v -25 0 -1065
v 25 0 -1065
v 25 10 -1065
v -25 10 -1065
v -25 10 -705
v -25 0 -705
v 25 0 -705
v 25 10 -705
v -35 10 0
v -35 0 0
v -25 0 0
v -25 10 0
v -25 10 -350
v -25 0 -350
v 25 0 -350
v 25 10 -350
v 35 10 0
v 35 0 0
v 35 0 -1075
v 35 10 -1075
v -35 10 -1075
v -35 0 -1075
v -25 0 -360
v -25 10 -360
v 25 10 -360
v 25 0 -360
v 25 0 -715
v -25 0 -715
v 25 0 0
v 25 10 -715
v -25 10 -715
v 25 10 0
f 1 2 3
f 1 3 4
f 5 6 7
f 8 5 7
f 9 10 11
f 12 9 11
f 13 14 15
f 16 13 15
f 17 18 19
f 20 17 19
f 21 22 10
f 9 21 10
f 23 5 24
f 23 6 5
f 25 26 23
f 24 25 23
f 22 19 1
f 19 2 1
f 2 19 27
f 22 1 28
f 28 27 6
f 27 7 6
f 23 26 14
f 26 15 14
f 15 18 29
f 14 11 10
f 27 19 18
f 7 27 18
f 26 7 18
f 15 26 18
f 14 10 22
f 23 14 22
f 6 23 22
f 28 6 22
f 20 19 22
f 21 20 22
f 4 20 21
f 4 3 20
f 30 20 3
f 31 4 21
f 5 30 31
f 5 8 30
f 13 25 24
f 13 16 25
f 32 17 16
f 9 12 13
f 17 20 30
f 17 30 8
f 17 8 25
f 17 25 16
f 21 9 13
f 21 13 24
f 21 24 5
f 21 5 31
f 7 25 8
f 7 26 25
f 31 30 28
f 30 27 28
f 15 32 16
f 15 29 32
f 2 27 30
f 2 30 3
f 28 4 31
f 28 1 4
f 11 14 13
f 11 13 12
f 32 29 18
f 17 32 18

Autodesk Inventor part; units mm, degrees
ref_plane "YZ Plane" through (0, 0, 0) normal (1, 0, 0) x (0, 1, 0)
ref_plane "XZ Plane" through (0, 0, 0) normal (0, 1, 0) x (-1, 0, 0)
ref_plane "XY Plane" through (0, 0, 0) normal (0, 0, 1) x (1, 0, 0)
sketch "Skizze2" plane through (0, 0, 0) normal (0, 1, 0) x (-1, 0, 0)
  line L0 (-35, 0) -> (-35, -1075)
  line L1 (-35, -1075) -> (35, -1075)
  line L2 (35, -1075) -> (35, 0)
  line L3 (-25, 0) -> (-25, -1075)
  line L4 (-25, -1065) -> (25, -1065)
  line L5 (25, -1075) -> (25, 0)
  line L6 (0, 28) -> (0, -210) construction
  line L7 (35, 0) -> (25, 0)
  line L8 (-25, 0) -> (-35, 0)
  line L9 (25, -350) -> (-25, -350)
  line L10 (-25, -350) -> (-25, -360)
  line L11 (-25, -360) -> (25, -360)
  line L12 (25, -360) -> (25, -350)
  line L13 (25, -705) -> (-25, -705)
  line L14 (-25, -705) -> (-25, -715)
  line L15 (-25, -715) -> (25, -715)
  line L16 (25, -715) -> (25, -705)
  point P0 (0, 0)
  dimension "d0" = 70
  dimension "d1" = 10
  dimension "laenge" = 1075
  dimension "d3" = 10
  dimension "d4" = 35
  dimension "d6" = 10
  dimension "d7" = 350
  dimension "d8" = 10
  dimension "d9" = 705
extrude "Extrusion1" add sketch "Skizze2" along normal blind 10 contours L8 L3 L1 L0 | L3 L4 L5 L1 | L9 L5 L11 L3 | L5 L7 L2 L1 | L3 L13 L5 L15
sketch "Skizze3" plane through (0, 0, 0) normal (0, -1, 0) x (1, 0, 0)
  line L0 (25, -715) -> (-25, -715) projected
  line L1 (25, -1065) -> (25, -715) projected
  line L2 (-25, -1065) -> (25, -1065) projected
  line L3 (-25, -715) -> (-25, -1065) projected
  line L4 (35, -1075) -> (-35, -1075) projected
  line L5 (35, 0) -> (35, -1075) projected
  line L6 (25, 0) -> (35, 0) projected
  line L7 (25, -350) -> (25, 0) projected
  line L8 (-25, -350) -> (25, -350) projected
  line L9 (-25, 0) -> (-25, -350) projected
  line L10 (-35, 0) -> (-25, 0) projected
  line L11 (-35, -1075) -> (-35, 0) projected
  line L12 (-25, -360) -> (-25, -705) projected
  line L13 (25, -360) -> (-25, -360) projected
  line L14 (25, -705) -> (25, -360) projected
  line L15 (-25, -705) -> (25, -705) projected
  line L16 (-35, -1075) -> (-35, 0) projected
  line L17 (35, -1075) -> (-35, -1075)
  line L18 (-35, -1075) -> (-35, -335)
  line L19 (-35, -335) -> (35, -335)
  line L20 (35, -335) -> (35, -1075)
  circle A0 centre (-30, -1070) radius 1.5
  circle A1 centre (-30, -340) radius 1.5
  line L21 (-30, -340) -> (-30, -1070) construction
  circle A2 centre (-30, -578.3333) radius 1.5
  circle A3 centre (-30, -831.6667) radius 1.5
  line L22 (0, -209.5174) -> (0, -1351.6434) construction
  circle A4 centre (30, -1070) radius 1.5
  circle A5 centre (30, -340) radius 1.5
  circle A6 centre (30, -578.3333) radius 1.5
  circle A7 centre (30, -831.6667) radius 1.5
  point P0 (0, 0)
  dimension "abdeckung" = 740
  dimension "d13" = 3
  dimension "d14" = 5
  dimension "d15" = 5
  dimension "d16" = 3
  dimension "d17" = 5
  dimension "d19" = 5
  dimension "d20" = 3
  dimension "d21" = 243.3333
  dimension "d22" = 3
  dimension "d23" = 243.3333
properties part number "Makerbeam-Struktur" material "Aluminium 6061"
